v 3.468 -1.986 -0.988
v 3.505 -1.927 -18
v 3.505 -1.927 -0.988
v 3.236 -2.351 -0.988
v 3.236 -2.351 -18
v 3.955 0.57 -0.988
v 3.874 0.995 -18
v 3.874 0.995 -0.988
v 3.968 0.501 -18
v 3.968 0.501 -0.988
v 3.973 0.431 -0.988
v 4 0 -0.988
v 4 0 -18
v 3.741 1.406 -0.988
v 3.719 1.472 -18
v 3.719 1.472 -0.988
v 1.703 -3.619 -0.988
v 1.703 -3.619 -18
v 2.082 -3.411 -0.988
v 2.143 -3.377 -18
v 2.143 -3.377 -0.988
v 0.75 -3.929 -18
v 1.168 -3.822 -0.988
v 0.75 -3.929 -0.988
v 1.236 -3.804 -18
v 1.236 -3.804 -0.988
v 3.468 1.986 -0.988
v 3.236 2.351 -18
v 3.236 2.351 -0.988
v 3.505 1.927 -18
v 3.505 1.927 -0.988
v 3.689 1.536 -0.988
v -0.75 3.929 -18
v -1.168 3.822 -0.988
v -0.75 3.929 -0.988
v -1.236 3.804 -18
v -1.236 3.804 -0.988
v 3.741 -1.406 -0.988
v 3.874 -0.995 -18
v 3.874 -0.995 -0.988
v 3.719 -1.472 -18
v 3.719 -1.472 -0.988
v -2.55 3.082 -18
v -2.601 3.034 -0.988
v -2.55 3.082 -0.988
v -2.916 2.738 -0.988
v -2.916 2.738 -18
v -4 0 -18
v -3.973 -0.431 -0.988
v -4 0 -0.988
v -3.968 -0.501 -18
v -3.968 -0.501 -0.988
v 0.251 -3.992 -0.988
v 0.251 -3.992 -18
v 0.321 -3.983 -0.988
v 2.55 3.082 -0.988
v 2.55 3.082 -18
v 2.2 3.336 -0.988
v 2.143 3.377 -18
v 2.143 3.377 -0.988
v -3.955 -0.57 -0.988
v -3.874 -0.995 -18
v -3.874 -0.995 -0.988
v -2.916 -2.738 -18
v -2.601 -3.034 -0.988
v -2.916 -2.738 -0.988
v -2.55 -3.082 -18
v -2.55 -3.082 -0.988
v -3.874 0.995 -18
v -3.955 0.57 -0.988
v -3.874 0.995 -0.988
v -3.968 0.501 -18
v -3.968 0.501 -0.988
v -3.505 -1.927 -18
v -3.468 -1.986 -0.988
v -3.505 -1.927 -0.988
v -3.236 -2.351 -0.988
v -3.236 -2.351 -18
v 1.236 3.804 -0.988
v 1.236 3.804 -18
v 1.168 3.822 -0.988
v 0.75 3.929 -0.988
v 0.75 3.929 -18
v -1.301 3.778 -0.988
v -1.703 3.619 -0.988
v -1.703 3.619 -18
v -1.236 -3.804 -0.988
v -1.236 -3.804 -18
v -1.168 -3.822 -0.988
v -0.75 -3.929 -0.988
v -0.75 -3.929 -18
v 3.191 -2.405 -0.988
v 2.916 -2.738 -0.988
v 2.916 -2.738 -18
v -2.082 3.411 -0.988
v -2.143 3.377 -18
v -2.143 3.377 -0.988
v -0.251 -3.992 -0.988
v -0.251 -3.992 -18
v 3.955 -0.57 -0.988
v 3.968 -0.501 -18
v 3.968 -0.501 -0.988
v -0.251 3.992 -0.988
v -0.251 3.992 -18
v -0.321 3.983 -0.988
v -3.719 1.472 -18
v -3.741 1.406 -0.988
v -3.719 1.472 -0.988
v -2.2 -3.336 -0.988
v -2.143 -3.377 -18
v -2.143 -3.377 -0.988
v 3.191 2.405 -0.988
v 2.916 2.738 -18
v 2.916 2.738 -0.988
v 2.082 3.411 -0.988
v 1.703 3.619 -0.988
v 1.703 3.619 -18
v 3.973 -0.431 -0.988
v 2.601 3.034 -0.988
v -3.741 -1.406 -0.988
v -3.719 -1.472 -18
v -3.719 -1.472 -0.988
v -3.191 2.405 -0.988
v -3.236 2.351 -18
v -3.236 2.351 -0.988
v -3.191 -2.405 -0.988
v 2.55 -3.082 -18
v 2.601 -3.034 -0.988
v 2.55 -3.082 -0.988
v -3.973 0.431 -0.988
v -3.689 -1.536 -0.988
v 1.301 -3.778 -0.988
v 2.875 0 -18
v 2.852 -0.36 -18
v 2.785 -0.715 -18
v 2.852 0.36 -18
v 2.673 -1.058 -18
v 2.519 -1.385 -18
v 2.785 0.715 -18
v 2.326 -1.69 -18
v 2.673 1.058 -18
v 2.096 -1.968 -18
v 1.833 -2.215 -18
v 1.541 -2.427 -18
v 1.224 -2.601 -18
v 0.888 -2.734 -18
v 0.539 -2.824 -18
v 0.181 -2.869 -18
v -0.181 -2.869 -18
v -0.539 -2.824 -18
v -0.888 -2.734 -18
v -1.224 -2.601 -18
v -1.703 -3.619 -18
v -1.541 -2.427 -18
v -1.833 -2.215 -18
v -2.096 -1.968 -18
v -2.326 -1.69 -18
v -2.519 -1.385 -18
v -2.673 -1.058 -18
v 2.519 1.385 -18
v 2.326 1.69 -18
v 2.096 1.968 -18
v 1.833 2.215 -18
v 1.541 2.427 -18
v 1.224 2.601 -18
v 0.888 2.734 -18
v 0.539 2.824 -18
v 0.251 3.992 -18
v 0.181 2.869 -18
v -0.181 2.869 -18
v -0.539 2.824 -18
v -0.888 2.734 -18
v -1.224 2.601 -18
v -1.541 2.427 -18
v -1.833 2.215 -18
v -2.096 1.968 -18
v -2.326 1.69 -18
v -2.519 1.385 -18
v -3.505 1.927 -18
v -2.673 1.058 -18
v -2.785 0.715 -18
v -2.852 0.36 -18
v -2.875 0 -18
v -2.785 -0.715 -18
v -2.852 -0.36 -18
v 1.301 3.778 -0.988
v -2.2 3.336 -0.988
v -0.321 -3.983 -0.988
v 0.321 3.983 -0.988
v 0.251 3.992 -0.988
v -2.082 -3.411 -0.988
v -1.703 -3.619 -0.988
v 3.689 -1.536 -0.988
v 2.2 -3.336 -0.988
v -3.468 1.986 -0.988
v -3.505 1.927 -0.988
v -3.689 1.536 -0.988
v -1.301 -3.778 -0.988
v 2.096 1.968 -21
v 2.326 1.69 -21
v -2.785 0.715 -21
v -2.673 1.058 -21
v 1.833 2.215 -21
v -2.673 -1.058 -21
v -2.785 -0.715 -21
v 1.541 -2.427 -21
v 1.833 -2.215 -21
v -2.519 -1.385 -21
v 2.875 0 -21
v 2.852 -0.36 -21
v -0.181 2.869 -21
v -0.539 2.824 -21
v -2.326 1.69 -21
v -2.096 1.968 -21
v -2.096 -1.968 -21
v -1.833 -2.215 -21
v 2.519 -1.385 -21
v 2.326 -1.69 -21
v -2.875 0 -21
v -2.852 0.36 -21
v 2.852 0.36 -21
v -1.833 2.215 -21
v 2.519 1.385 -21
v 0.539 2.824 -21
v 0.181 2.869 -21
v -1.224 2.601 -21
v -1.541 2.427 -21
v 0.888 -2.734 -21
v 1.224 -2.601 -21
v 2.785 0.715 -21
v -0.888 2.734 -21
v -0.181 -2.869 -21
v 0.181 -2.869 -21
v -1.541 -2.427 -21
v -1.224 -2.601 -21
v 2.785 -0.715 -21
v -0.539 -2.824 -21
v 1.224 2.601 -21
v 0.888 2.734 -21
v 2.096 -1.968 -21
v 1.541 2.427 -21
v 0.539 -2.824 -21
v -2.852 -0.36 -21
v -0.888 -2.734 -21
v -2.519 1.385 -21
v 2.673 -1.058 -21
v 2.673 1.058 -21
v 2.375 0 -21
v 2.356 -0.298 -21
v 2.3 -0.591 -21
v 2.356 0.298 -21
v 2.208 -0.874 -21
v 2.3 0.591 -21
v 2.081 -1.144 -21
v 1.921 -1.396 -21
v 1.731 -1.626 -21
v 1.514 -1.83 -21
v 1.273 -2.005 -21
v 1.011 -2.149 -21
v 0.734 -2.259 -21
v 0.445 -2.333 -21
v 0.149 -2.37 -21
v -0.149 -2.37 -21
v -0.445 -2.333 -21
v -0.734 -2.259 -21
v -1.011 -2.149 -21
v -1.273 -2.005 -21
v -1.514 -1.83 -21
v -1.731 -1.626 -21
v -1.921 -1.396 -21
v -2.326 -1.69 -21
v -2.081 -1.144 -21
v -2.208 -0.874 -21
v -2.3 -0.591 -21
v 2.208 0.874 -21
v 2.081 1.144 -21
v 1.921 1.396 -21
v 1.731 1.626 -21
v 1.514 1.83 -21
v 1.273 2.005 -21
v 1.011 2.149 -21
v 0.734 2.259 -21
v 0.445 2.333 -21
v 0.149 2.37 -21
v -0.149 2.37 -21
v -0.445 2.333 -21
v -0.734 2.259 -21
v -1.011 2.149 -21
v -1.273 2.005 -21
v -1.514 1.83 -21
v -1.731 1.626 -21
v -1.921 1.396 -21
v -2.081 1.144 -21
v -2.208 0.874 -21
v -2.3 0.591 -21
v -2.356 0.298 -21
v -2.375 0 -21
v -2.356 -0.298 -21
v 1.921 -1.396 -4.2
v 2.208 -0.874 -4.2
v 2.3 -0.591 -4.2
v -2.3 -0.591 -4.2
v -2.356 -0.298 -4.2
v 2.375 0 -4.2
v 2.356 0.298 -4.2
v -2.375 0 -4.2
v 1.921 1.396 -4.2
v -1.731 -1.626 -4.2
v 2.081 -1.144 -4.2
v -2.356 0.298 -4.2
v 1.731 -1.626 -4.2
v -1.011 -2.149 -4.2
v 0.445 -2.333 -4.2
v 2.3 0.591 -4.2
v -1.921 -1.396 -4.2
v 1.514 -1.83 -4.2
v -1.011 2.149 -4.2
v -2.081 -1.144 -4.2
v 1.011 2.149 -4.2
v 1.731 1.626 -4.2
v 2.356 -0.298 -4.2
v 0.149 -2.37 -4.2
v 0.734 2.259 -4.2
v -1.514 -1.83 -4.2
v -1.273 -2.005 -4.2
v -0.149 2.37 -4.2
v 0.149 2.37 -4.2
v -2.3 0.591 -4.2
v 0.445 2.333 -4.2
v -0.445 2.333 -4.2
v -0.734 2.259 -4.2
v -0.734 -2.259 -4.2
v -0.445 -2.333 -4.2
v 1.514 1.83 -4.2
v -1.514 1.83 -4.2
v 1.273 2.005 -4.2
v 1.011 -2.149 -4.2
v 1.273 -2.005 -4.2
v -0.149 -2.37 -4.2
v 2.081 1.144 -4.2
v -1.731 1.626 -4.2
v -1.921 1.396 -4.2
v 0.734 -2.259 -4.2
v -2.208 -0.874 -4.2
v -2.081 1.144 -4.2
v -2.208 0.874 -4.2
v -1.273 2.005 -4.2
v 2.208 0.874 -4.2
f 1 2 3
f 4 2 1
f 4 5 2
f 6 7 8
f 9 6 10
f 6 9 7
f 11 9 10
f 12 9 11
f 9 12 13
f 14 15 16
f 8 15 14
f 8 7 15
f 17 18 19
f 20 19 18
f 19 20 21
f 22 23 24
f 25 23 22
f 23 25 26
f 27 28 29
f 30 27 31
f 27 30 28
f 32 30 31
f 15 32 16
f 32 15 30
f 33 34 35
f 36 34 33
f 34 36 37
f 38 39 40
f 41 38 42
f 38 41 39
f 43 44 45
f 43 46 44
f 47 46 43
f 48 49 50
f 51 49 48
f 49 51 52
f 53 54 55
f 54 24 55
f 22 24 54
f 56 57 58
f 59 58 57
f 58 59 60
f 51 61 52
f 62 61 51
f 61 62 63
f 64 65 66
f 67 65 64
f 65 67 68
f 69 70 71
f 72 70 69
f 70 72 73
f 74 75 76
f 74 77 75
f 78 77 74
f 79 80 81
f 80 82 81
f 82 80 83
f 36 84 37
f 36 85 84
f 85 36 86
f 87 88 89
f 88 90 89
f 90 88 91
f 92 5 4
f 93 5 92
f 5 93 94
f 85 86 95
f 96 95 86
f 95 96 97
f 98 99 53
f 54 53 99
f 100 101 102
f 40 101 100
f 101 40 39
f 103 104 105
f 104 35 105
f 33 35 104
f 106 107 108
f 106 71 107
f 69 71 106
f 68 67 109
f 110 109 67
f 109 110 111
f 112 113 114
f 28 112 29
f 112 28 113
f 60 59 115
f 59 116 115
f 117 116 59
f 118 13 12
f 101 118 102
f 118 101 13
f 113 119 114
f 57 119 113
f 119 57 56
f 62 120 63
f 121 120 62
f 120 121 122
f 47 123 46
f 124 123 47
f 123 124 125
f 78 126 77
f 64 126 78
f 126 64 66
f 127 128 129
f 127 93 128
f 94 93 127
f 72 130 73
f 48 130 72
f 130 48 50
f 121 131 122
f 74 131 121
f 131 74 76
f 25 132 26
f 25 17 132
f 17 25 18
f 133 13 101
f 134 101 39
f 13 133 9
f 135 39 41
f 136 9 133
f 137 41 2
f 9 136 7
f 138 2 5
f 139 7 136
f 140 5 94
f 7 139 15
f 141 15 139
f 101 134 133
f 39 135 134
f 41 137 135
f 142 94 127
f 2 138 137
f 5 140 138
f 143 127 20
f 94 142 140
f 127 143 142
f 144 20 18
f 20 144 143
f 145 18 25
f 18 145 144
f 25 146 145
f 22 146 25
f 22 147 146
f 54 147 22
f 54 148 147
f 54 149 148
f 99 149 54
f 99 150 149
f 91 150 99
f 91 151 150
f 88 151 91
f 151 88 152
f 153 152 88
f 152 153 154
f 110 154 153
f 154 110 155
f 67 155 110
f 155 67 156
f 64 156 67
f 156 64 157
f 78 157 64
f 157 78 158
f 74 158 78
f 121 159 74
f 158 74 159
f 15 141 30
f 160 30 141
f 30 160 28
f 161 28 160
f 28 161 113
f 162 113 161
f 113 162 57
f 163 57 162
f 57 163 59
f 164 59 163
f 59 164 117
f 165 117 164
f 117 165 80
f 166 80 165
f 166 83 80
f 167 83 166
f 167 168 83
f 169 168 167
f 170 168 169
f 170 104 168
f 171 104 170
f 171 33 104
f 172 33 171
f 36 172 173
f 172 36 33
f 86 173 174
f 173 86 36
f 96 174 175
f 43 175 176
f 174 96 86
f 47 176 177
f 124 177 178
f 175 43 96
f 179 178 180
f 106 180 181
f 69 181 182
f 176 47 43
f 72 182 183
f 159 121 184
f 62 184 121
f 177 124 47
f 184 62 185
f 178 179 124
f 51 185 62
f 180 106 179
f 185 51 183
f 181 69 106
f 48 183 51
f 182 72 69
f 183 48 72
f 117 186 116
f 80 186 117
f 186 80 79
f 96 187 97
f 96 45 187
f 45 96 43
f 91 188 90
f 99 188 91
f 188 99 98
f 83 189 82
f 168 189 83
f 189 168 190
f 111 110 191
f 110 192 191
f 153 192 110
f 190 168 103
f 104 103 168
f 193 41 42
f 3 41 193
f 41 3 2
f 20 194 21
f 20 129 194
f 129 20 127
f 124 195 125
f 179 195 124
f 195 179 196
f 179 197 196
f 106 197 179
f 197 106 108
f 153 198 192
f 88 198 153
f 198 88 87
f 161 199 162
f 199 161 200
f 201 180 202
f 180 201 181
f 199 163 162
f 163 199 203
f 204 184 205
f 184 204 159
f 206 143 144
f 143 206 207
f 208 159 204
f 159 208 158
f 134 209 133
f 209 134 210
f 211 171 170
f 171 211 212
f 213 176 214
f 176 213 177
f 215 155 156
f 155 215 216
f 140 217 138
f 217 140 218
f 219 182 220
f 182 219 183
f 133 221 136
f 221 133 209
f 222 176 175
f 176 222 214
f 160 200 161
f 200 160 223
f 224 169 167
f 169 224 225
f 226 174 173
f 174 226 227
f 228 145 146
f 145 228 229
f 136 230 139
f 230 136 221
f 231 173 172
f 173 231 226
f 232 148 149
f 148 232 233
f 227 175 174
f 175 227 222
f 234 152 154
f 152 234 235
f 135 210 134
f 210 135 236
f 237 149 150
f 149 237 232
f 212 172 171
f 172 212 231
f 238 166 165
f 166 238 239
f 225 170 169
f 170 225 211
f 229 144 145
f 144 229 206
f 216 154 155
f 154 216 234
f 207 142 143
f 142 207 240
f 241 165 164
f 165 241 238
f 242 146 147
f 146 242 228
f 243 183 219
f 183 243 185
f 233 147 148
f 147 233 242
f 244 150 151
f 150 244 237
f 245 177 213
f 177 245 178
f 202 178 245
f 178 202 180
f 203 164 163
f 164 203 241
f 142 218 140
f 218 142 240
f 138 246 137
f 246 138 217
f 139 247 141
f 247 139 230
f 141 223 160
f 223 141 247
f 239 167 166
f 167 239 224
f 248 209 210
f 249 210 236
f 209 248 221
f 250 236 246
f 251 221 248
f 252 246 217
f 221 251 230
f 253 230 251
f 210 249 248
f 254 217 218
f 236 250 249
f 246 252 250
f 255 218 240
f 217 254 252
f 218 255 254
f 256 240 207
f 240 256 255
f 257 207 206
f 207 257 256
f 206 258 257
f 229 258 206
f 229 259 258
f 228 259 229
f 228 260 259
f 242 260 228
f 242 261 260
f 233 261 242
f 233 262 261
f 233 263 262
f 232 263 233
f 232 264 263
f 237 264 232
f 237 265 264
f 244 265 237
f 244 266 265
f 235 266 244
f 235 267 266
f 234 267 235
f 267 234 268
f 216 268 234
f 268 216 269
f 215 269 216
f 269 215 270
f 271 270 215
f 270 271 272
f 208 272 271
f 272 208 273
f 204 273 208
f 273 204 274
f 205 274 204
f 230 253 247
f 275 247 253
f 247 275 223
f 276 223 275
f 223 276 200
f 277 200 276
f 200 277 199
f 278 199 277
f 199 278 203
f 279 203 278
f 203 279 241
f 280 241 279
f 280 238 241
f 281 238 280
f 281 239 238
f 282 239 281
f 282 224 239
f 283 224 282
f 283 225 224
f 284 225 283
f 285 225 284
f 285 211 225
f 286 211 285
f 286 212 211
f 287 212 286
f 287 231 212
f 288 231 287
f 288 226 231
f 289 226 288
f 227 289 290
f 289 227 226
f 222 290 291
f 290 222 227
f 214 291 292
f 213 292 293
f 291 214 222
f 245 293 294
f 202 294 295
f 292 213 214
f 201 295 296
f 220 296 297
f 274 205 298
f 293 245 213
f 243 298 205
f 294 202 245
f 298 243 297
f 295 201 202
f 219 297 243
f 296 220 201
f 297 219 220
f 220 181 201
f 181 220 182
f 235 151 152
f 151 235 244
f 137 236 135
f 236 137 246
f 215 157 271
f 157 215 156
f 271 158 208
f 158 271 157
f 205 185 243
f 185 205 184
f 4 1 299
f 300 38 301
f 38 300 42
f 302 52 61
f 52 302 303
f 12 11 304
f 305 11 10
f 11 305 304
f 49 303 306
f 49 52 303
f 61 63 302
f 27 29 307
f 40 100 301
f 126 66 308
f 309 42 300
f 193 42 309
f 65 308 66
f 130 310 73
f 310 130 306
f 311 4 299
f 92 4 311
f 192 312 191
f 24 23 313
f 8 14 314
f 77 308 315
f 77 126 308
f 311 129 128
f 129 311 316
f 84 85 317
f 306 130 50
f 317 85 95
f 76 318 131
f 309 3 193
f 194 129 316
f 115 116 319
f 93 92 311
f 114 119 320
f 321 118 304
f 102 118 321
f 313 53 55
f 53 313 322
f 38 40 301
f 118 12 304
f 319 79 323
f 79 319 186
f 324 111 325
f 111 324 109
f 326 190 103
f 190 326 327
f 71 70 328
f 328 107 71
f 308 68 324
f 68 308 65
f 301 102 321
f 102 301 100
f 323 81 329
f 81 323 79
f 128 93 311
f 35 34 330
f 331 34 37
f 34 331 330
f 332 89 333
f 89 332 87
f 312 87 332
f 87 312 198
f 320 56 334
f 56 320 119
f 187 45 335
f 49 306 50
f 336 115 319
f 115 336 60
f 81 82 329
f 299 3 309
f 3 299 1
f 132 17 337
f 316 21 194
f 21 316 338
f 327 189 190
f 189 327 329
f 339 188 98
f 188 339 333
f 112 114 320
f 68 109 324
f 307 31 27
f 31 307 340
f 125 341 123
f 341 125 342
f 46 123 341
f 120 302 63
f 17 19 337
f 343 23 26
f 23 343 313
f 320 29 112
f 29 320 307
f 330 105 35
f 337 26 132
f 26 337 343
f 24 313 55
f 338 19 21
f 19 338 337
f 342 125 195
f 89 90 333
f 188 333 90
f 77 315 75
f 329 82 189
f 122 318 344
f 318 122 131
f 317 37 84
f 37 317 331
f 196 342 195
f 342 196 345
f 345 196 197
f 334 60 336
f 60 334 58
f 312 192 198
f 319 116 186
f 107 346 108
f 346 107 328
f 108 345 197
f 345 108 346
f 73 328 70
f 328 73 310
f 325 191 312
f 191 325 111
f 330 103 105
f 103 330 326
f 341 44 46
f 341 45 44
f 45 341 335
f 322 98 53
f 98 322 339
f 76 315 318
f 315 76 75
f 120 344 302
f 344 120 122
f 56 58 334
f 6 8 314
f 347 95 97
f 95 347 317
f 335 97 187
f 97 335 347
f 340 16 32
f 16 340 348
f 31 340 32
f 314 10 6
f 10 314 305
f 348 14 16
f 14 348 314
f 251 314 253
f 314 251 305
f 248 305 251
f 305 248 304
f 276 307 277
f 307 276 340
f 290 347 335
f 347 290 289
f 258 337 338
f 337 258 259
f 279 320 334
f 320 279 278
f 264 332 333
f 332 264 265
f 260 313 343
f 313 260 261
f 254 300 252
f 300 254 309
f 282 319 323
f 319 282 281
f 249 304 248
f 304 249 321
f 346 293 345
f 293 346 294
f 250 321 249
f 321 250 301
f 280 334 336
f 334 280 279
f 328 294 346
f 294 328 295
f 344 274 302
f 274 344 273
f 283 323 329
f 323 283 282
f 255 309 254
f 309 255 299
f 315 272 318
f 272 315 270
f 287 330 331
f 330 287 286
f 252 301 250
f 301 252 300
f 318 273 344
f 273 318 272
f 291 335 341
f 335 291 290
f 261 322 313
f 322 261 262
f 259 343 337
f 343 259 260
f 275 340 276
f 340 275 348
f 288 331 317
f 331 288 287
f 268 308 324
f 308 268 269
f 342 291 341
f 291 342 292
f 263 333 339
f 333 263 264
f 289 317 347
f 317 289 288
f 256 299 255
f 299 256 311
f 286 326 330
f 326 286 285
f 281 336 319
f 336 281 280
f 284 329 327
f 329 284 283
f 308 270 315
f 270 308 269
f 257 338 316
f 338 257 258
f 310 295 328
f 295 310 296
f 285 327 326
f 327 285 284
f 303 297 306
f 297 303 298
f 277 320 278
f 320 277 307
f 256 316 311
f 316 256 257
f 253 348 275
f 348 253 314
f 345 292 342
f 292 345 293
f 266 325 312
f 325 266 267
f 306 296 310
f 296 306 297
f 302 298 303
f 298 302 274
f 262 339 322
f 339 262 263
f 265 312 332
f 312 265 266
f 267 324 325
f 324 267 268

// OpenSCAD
$fn = 50;

difference() {
	union() {
		translate(v = [0, 0, -18.0]) {
			cylinder(h = 18, r = 4.0);
		}
		#translate(v = [0, 0, -21.0]) {
			cylinder(h = 21, r = 2.875);
		}
	}
	union() {
		translate(v = [0, 0, 0]) {
			rotate(a = [0, 0, 0]) {
				difference() {
					union() {
						translate(v = [0, 0, -21.0]) {
							cylinder(h = 21, r = 2.25);
						}
						translate(v = [0, 0, -4.2]) {
							cylinder(h = 4.2, r1 = 2.375, r2 = 4.5);
						}
						translate(v = [0, 0, -21.0]) {
							cylinder(h = 21, r = 2.375);
						}
						translate(v = [0, 0, -21.0]) {
							cylinder(h = 21, r = 2.25);
						}
					}
					union();
				}
			}
		}
	}
}
